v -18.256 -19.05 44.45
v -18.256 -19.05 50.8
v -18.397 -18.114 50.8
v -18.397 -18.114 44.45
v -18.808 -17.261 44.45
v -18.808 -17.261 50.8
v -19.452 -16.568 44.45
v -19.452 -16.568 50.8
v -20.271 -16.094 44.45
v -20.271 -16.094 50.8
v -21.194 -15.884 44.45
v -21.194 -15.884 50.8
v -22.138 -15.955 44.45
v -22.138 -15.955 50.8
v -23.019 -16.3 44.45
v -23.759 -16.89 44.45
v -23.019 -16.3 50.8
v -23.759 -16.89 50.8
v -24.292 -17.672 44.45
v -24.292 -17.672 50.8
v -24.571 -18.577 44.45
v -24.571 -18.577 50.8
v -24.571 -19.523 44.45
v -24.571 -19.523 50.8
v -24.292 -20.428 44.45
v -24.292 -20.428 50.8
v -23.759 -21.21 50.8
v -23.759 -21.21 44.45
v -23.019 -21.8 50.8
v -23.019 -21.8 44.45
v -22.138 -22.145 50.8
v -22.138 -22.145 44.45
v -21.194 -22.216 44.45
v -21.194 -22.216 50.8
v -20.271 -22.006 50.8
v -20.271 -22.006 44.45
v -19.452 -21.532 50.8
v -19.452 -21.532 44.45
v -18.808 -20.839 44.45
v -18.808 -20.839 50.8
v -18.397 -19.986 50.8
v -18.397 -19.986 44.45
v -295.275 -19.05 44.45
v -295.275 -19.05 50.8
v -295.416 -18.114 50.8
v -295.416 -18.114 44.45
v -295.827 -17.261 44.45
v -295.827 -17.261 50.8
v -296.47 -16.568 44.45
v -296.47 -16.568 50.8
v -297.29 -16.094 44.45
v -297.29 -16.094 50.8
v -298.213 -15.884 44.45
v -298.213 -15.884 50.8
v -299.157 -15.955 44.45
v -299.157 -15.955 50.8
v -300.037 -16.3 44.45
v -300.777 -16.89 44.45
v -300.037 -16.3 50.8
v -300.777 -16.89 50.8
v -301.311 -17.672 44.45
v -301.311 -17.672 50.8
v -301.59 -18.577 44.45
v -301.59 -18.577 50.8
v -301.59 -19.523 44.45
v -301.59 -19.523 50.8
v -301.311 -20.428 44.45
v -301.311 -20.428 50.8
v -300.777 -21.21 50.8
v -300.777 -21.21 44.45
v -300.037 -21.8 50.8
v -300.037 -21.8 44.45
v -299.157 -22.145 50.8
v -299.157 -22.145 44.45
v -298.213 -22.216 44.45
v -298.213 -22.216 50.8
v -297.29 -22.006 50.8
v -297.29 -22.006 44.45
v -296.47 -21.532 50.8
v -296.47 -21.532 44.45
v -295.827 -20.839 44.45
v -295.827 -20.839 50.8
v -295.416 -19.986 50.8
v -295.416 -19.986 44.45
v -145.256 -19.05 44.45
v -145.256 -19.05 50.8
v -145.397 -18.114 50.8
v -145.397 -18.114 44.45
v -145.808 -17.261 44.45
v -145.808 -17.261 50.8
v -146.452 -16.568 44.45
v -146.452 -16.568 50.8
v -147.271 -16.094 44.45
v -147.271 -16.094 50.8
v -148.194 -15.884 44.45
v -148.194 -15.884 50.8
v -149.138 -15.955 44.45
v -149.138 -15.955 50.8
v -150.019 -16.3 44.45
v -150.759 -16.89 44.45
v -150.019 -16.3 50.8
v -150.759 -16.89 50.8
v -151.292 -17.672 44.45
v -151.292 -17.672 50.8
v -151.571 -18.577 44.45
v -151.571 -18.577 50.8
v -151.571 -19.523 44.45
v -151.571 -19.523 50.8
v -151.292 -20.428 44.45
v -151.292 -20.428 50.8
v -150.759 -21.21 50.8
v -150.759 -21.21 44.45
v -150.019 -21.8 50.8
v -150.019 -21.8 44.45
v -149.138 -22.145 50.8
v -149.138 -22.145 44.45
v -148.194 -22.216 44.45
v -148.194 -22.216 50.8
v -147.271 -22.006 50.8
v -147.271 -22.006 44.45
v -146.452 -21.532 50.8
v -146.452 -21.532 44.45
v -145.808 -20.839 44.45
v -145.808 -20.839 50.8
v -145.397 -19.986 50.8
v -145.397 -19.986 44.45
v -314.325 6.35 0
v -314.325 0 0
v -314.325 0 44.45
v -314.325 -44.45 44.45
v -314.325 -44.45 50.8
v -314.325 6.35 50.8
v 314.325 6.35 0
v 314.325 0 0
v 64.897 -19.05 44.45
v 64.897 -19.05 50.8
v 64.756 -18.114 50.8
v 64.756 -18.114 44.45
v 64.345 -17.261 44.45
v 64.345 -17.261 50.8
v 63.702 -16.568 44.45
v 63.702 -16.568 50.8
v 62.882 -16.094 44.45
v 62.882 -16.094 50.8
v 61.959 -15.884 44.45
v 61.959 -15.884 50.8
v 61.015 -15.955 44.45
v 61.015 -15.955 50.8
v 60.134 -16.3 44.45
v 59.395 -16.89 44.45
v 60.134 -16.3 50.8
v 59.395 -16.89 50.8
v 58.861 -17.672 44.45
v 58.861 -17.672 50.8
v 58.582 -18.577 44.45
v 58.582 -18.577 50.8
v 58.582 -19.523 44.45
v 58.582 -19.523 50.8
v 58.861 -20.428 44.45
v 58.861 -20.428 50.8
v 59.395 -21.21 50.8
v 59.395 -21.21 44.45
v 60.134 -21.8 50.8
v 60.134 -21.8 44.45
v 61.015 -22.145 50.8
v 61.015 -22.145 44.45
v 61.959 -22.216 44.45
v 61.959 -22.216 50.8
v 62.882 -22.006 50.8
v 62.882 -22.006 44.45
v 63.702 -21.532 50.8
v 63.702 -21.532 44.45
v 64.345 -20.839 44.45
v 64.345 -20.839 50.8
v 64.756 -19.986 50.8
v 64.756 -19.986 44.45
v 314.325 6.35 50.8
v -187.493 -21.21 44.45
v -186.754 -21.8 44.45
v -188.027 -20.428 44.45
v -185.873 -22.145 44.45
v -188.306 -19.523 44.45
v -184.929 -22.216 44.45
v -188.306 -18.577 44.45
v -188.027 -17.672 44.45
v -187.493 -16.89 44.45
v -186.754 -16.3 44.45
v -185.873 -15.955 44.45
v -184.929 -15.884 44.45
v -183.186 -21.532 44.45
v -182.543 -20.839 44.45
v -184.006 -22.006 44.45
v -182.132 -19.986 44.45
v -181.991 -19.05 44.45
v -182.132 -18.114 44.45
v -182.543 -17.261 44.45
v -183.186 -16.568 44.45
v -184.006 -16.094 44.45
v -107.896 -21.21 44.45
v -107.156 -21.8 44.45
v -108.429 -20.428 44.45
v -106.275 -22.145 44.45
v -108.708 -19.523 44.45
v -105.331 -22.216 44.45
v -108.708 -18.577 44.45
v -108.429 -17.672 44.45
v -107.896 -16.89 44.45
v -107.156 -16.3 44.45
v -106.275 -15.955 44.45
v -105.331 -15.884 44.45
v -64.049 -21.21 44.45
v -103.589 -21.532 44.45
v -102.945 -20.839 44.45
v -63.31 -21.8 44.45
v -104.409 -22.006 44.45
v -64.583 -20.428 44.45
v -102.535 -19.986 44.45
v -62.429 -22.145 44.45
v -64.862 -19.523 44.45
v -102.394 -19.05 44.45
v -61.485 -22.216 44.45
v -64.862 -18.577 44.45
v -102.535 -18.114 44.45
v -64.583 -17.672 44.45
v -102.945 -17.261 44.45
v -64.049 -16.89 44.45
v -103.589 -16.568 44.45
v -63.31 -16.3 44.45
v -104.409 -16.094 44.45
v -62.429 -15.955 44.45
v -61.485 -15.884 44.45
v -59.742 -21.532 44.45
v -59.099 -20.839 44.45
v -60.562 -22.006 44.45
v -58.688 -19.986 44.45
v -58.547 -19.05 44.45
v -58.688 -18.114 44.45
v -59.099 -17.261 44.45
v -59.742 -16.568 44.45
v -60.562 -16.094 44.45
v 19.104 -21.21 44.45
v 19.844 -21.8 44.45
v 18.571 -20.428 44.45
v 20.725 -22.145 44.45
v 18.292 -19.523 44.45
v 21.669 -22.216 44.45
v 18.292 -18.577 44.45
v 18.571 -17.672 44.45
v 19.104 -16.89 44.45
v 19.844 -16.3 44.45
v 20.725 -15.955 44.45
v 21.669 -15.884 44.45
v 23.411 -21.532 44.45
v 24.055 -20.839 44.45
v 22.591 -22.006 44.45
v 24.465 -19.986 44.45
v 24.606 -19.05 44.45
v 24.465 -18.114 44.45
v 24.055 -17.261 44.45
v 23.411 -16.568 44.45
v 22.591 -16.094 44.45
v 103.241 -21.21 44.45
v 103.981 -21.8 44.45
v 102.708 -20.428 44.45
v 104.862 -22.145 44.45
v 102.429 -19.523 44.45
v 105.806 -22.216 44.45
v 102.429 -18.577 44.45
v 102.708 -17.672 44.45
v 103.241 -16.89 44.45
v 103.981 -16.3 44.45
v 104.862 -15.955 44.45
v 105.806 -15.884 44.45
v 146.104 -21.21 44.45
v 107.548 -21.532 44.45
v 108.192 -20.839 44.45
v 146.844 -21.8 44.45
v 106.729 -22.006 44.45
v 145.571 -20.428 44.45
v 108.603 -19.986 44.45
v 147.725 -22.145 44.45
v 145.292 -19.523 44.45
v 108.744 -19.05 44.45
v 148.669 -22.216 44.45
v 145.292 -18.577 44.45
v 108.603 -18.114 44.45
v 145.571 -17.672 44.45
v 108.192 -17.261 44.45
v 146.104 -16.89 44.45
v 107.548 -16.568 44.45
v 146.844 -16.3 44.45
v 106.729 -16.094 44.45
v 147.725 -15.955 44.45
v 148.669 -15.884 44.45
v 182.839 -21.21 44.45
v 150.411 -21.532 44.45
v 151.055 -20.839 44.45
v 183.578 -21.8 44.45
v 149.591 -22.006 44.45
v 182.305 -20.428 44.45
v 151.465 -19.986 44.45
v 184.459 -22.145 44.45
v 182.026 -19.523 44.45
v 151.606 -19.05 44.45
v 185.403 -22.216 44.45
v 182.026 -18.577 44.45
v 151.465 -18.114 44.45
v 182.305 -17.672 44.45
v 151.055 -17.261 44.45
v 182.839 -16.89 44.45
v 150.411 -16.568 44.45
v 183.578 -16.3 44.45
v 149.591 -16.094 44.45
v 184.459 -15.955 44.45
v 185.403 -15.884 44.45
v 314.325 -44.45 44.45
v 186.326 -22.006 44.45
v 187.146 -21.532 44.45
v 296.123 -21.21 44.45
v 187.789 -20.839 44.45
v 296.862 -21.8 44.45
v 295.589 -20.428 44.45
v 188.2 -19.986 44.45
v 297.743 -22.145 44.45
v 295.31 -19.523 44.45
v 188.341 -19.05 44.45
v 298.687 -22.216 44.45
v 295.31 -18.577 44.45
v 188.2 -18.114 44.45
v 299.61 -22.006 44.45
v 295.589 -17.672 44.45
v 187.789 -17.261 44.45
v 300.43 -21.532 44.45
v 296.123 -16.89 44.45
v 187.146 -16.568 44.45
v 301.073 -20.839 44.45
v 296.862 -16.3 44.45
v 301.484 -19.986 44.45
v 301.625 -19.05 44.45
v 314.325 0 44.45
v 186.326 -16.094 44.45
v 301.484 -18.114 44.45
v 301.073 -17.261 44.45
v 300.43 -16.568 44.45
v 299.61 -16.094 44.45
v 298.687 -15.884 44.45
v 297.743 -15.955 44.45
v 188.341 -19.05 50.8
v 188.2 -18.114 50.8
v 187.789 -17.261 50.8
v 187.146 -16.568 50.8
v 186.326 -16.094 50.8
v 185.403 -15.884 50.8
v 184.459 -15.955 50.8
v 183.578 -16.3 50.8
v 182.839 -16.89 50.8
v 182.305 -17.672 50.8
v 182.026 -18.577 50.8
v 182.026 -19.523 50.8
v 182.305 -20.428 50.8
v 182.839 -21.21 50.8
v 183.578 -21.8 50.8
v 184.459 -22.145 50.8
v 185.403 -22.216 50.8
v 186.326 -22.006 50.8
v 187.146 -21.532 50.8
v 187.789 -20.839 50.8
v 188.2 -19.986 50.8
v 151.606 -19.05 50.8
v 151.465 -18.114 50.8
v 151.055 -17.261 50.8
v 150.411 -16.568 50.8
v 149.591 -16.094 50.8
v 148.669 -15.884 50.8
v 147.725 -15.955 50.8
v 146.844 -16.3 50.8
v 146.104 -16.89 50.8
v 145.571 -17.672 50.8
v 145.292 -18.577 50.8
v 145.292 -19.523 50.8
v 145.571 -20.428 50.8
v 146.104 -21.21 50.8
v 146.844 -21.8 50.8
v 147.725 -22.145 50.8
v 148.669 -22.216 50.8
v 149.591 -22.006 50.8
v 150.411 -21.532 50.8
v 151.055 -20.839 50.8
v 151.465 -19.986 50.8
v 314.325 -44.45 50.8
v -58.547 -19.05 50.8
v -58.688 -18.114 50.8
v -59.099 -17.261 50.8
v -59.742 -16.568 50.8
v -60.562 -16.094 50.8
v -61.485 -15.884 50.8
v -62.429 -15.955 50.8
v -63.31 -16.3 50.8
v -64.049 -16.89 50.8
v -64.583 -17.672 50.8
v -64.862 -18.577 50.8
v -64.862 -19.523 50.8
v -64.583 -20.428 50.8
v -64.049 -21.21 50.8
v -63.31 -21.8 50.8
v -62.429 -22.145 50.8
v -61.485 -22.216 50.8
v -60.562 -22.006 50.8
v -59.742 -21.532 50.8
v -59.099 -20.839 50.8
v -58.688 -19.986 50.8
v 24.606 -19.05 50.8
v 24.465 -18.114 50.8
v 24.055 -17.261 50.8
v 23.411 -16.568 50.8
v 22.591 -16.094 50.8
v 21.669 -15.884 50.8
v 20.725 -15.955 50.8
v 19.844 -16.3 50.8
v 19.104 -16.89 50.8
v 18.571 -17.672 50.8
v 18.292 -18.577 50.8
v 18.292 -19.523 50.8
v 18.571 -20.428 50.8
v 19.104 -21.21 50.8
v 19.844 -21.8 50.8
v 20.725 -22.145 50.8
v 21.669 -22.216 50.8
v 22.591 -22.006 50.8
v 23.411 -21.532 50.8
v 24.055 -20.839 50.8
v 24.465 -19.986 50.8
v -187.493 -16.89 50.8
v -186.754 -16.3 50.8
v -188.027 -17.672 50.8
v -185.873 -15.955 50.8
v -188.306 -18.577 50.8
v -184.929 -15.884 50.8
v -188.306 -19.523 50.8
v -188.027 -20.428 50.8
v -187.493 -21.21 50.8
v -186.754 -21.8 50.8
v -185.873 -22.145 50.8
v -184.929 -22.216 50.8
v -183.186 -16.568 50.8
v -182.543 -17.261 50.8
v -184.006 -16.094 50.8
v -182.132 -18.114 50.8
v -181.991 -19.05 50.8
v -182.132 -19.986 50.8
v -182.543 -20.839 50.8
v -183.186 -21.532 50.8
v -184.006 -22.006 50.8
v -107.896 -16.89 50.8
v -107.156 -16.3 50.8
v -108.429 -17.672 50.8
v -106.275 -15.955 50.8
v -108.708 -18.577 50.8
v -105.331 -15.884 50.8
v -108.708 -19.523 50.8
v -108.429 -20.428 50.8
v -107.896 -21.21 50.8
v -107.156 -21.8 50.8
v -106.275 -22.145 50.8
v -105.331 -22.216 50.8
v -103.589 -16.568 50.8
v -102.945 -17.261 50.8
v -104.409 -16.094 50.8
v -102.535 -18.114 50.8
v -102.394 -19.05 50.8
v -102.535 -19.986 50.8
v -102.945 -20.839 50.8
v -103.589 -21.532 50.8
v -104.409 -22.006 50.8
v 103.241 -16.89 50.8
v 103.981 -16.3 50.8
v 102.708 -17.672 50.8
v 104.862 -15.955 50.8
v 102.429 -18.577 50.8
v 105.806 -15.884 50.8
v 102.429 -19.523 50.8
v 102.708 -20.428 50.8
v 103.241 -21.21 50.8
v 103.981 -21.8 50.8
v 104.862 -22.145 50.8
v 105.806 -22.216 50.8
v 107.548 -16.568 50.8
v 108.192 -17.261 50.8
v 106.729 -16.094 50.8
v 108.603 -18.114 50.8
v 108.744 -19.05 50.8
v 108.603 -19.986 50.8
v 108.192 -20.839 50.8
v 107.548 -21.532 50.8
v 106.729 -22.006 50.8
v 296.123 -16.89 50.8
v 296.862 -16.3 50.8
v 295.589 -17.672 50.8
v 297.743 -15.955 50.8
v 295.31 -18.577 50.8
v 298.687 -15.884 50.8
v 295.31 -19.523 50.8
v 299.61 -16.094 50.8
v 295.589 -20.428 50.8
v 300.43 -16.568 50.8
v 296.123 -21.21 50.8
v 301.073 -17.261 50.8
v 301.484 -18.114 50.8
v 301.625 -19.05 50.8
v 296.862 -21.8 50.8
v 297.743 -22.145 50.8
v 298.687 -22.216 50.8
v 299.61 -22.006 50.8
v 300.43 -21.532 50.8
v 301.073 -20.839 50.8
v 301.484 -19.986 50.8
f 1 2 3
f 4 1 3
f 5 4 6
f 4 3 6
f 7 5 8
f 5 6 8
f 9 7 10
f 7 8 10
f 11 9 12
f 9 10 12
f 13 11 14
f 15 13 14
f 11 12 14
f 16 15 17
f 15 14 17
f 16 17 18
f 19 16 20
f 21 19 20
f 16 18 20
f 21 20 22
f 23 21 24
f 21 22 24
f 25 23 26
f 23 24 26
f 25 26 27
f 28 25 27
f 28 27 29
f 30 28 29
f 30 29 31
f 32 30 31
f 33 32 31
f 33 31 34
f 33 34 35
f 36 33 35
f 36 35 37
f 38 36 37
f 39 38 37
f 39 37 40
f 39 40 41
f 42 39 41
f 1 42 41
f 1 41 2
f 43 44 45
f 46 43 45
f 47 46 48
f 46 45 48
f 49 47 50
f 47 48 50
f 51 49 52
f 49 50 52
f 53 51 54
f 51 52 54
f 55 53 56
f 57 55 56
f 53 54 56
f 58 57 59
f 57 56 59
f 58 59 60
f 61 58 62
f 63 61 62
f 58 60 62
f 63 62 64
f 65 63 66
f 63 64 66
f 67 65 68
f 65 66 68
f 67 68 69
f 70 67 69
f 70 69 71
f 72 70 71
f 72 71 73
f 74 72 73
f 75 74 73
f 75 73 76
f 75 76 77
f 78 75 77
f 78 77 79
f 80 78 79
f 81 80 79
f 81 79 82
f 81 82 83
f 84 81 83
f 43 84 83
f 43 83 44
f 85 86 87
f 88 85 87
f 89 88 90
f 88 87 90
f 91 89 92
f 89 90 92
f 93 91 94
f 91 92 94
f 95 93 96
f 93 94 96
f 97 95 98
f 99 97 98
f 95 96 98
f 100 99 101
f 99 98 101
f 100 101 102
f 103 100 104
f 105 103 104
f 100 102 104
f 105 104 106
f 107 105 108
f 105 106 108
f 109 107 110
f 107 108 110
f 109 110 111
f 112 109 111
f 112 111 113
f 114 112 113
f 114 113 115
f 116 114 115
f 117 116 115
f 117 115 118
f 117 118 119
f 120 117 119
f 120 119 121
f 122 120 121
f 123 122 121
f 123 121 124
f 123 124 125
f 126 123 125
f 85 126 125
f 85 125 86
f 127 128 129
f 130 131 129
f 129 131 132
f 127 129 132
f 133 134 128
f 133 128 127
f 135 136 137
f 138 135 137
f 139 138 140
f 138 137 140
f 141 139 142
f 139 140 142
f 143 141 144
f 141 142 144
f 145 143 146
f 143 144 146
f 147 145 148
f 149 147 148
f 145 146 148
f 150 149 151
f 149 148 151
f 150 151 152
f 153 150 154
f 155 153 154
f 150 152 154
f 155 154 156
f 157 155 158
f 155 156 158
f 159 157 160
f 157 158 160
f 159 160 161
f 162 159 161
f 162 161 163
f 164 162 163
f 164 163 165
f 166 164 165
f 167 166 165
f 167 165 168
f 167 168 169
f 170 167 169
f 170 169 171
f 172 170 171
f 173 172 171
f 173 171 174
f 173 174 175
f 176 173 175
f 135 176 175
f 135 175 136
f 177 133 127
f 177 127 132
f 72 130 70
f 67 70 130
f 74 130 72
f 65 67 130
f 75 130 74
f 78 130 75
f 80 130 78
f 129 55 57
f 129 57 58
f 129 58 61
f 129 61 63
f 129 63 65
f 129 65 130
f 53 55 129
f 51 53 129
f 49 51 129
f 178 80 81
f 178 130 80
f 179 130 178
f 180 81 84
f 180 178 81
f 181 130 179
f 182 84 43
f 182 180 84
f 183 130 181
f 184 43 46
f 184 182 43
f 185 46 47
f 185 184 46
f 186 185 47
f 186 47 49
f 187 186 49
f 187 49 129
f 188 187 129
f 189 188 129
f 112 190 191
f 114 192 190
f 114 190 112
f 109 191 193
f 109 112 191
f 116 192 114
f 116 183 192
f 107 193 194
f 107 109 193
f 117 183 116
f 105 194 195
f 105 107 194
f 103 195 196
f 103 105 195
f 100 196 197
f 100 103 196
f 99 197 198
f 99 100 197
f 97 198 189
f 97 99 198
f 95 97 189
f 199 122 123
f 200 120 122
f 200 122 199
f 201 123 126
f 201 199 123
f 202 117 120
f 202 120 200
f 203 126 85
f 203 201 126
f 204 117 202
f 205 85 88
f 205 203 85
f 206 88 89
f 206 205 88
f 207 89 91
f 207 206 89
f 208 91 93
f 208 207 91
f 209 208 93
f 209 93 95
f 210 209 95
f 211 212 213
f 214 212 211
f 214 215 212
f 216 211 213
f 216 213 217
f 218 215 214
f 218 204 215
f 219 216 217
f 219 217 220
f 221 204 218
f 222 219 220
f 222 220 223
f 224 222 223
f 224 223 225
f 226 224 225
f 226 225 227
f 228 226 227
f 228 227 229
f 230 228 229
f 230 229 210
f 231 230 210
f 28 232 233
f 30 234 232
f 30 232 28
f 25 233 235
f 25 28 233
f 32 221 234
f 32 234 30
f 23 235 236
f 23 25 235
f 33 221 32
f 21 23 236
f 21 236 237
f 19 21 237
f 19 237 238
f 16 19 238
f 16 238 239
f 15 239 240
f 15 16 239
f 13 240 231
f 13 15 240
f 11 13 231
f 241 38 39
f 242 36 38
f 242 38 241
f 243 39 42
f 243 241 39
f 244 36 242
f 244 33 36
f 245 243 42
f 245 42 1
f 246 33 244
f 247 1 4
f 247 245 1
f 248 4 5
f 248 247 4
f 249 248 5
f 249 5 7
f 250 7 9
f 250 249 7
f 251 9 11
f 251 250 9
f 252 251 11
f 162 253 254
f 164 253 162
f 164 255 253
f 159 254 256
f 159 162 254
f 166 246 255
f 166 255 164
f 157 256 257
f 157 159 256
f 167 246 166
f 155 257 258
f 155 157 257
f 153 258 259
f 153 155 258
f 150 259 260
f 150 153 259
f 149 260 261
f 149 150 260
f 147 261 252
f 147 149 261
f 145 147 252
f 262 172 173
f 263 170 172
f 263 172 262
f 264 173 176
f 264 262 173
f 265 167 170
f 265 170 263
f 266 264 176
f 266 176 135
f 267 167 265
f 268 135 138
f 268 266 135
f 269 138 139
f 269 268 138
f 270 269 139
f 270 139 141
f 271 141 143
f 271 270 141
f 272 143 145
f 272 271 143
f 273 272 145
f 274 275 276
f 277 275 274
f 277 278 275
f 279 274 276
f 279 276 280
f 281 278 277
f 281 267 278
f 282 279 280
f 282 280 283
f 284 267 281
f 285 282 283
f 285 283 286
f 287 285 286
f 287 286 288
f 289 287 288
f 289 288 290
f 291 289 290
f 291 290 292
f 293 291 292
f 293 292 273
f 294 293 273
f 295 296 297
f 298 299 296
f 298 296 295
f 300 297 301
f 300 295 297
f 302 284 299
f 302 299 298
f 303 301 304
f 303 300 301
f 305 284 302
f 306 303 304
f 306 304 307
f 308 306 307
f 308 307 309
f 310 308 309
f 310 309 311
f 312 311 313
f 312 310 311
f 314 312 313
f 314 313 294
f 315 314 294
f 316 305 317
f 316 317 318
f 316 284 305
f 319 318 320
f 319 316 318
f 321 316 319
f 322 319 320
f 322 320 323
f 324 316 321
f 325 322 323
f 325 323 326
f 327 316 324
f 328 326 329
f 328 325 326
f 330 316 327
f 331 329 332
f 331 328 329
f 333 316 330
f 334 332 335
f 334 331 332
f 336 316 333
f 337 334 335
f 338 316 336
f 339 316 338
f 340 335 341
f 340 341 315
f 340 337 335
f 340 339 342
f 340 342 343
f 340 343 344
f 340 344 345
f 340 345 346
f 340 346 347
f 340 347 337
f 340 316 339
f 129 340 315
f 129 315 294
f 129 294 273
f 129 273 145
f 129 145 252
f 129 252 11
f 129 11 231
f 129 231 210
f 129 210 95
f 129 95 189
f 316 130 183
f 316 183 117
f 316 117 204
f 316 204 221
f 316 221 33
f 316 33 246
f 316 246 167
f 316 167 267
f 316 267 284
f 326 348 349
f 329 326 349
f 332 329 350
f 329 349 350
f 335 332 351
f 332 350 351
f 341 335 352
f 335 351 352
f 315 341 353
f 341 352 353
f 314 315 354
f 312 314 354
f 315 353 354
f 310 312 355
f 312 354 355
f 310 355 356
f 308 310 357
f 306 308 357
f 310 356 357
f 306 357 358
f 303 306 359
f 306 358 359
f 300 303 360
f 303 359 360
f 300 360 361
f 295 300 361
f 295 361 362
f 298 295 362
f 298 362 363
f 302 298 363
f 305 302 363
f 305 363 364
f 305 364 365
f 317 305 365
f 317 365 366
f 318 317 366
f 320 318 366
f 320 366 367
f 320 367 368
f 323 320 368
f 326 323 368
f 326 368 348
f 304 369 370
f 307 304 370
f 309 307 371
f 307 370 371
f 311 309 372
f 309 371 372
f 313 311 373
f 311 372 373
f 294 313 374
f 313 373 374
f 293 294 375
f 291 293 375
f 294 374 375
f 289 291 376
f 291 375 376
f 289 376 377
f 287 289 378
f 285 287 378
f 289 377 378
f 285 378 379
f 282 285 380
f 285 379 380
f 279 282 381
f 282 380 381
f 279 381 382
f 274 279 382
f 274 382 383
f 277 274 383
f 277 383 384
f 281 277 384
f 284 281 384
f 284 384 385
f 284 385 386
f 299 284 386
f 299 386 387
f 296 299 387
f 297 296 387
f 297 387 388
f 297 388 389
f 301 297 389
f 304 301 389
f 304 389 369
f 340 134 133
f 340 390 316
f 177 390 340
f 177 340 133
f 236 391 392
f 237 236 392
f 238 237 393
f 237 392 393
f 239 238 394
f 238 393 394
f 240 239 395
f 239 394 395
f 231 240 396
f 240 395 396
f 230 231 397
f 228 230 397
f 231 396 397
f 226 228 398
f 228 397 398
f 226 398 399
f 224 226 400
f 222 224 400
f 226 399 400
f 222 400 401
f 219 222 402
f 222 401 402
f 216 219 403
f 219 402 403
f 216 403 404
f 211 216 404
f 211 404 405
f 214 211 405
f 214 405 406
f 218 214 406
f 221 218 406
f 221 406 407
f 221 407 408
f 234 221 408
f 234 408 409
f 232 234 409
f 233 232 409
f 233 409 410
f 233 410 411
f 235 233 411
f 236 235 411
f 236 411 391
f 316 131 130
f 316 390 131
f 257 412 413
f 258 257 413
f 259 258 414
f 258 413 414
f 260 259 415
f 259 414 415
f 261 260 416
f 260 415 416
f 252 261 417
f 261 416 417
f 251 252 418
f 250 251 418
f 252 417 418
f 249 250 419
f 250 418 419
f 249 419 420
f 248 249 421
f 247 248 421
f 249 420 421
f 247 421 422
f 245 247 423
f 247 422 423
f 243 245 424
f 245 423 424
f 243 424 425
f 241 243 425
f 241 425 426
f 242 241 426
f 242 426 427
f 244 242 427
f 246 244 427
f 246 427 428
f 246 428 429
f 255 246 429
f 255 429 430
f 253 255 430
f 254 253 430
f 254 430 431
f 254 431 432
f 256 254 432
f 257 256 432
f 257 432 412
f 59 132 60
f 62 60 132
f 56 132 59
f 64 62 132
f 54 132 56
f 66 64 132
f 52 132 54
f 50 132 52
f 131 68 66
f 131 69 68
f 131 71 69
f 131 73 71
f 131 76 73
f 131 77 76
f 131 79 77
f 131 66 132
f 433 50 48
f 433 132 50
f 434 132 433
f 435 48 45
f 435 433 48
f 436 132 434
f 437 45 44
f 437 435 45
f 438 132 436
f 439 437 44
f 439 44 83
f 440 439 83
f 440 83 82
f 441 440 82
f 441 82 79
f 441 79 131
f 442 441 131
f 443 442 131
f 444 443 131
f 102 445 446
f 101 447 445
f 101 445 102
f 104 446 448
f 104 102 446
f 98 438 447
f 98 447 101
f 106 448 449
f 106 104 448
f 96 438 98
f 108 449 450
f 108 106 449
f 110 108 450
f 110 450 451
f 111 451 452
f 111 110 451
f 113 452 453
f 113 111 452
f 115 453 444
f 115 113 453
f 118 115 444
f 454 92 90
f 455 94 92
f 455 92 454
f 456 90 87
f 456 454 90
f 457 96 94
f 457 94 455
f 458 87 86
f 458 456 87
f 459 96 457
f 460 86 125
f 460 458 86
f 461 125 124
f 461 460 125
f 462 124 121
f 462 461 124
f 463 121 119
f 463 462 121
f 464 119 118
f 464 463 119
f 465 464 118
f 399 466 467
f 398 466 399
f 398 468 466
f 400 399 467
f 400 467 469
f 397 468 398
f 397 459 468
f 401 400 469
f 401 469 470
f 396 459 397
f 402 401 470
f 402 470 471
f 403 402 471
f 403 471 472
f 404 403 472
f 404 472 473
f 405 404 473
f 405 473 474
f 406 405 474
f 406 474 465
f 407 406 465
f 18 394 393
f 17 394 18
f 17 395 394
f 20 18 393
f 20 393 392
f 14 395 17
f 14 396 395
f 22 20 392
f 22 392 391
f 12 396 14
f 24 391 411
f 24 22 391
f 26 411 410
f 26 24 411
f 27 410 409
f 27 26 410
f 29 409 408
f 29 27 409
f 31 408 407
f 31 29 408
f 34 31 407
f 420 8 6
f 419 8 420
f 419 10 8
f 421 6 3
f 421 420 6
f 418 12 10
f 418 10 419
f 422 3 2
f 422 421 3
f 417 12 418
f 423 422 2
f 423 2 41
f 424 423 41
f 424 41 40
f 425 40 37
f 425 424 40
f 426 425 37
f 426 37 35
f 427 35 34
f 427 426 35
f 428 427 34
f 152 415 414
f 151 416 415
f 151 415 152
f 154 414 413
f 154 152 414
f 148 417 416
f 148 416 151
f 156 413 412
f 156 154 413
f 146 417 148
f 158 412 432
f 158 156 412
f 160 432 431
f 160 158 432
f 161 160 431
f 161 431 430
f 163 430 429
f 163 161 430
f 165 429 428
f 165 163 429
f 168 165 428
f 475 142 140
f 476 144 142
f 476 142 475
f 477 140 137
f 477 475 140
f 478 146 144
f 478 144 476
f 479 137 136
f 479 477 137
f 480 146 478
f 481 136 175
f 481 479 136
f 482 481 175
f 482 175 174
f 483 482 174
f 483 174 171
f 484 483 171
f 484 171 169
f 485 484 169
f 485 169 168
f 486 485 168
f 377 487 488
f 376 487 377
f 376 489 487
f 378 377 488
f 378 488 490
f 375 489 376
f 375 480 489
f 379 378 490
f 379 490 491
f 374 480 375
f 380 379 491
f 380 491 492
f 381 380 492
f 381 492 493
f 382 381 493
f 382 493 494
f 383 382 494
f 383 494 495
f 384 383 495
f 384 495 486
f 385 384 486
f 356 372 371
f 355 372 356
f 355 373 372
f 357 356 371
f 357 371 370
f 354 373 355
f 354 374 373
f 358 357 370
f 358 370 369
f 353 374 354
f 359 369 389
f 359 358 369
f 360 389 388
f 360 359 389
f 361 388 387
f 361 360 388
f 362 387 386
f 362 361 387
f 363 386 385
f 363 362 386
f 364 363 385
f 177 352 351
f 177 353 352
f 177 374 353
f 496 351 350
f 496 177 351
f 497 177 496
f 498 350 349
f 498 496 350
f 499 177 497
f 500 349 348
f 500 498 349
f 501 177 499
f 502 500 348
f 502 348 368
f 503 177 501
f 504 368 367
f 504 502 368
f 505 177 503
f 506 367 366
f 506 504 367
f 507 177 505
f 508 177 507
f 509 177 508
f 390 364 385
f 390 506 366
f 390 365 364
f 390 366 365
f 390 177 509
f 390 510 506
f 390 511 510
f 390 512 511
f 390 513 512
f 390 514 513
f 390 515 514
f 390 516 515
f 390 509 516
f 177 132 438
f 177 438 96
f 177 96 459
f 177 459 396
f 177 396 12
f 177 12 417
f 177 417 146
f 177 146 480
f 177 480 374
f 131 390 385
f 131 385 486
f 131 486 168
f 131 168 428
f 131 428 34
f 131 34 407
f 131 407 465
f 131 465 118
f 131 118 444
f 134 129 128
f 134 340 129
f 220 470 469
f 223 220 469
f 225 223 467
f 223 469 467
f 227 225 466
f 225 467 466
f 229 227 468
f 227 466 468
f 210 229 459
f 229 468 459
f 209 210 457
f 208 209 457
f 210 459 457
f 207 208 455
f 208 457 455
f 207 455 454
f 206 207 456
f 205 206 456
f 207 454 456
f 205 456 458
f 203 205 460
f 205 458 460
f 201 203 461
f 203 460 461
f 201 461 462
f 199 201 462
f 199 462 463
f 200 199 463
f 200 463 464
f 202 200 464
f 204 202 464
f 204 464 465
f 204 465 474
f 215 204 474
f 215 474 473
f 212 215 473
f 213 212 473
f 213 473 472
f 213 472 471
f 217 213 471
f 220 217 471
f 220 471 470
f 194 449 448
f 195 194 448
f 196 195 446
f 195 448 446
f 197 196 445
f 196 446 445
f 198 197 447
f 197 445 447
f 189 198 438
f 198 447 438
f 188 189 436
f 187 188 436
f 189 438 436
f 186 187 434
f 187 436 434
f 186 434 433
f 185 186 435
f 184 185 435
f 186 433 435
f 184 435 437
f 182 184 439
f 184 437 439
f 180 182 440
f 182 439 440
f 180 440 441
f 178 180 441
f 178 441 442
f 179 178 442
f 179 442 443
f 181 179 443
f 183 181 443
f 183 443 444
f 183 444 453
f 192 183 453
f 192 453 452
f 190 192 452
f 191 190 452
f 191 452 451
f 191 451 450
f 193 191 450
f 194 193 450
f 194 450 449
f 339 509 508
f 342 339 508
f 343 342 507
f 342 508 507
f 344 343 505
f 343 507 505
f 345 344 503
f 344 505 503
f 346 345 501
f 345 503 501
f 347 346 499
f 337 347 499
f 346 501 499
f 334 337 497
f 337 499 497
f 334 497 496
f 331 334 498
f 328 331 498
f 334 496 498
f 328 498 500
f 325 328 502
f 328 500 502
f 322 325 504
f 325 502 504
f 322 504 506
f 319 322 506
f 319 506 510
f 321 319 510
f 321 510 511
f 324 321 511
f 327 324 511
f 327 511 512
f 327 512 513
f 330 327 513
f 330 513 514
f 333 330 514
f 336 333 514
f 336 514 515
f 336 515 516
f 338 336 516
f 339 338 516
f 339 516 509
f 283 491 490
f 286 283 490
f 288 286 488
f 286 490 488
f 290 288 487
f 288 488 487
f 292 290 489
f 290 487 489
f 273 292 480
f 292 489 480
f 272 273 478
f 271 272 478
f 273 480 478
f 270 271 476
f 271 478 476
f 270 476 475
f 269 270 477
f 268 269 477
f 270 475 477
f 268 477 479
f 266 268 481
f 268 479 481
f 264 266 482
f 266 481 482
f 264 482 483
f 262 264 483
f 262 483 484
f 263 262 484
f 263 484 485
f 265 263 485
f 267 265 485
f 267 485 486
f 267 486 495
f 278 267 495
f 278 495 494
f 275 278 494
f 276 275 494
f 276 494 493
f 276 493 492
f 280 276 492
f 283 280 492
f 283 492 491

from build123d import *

# Parameters (mm, degrees)
F1_DEPTH = 314.325
F2_R     = 3.175
F3_DEPTH = 50.801
F4_R     = 3.175
F5_DEPTH = 50.801


with BuildPart() as f1:
    # F0 (on Right) → F1 (new body, symmetric)
    with BuildSketch(Plane.YZ):
        Polygon((0, 44.45), (0, 0), (6.35, 0), (6.35, 50.8), (-44.45, 50.8), (-44.45, 44.45), align=None)
    extrude(amount=F1_DEPTH, both=True)

    # F2 (on face) → F3 (cut, through all)
    with BuildSketch(Plane.XY.offset(50.8)):
        with Locations((-298.45, -19.05)):
            Circle(F2_R)
        with Locations((-105.56875, -19.05)):
            Circle(F2_R)
        with Locations((298.45, -19.05)):
            Circle(F2_R)
        with Locations((-148.43125, -19.05)):
            Circle(F2_R)
        with Locations((-21.43125, -19.05)):
            Circle(F2_R)
        with Locations((21.43125, -19.05)):
            Circle(F2_R)
        with Locations((105.56875, -19.05)):
            Circle(F2_R)
        with Locations((148.43125, -19.05)):
            Circle(F2_R)
    extrude(amount=-F3_DEPTH, mode=Mode.SUBTRACT)

    # F4 (on face) → F5 (cut, through all)
    with BuildSketch(Plane.XY.offset(50.8)):
        with Locations((-185.166, -19.05)):
            Circle(F4_R)
        with Locations((-61.722, -19.05)):
            Circle(F4_R)
        with Locations((61.722, -19.05)):
            Circle(F4_R)
        with Locations((185.166, -19.05)):
            Circle(F4_R)
    extrude(amount=-F5_DEPTH, mode=Mode.SUBTRACT)


solid = f1.part
